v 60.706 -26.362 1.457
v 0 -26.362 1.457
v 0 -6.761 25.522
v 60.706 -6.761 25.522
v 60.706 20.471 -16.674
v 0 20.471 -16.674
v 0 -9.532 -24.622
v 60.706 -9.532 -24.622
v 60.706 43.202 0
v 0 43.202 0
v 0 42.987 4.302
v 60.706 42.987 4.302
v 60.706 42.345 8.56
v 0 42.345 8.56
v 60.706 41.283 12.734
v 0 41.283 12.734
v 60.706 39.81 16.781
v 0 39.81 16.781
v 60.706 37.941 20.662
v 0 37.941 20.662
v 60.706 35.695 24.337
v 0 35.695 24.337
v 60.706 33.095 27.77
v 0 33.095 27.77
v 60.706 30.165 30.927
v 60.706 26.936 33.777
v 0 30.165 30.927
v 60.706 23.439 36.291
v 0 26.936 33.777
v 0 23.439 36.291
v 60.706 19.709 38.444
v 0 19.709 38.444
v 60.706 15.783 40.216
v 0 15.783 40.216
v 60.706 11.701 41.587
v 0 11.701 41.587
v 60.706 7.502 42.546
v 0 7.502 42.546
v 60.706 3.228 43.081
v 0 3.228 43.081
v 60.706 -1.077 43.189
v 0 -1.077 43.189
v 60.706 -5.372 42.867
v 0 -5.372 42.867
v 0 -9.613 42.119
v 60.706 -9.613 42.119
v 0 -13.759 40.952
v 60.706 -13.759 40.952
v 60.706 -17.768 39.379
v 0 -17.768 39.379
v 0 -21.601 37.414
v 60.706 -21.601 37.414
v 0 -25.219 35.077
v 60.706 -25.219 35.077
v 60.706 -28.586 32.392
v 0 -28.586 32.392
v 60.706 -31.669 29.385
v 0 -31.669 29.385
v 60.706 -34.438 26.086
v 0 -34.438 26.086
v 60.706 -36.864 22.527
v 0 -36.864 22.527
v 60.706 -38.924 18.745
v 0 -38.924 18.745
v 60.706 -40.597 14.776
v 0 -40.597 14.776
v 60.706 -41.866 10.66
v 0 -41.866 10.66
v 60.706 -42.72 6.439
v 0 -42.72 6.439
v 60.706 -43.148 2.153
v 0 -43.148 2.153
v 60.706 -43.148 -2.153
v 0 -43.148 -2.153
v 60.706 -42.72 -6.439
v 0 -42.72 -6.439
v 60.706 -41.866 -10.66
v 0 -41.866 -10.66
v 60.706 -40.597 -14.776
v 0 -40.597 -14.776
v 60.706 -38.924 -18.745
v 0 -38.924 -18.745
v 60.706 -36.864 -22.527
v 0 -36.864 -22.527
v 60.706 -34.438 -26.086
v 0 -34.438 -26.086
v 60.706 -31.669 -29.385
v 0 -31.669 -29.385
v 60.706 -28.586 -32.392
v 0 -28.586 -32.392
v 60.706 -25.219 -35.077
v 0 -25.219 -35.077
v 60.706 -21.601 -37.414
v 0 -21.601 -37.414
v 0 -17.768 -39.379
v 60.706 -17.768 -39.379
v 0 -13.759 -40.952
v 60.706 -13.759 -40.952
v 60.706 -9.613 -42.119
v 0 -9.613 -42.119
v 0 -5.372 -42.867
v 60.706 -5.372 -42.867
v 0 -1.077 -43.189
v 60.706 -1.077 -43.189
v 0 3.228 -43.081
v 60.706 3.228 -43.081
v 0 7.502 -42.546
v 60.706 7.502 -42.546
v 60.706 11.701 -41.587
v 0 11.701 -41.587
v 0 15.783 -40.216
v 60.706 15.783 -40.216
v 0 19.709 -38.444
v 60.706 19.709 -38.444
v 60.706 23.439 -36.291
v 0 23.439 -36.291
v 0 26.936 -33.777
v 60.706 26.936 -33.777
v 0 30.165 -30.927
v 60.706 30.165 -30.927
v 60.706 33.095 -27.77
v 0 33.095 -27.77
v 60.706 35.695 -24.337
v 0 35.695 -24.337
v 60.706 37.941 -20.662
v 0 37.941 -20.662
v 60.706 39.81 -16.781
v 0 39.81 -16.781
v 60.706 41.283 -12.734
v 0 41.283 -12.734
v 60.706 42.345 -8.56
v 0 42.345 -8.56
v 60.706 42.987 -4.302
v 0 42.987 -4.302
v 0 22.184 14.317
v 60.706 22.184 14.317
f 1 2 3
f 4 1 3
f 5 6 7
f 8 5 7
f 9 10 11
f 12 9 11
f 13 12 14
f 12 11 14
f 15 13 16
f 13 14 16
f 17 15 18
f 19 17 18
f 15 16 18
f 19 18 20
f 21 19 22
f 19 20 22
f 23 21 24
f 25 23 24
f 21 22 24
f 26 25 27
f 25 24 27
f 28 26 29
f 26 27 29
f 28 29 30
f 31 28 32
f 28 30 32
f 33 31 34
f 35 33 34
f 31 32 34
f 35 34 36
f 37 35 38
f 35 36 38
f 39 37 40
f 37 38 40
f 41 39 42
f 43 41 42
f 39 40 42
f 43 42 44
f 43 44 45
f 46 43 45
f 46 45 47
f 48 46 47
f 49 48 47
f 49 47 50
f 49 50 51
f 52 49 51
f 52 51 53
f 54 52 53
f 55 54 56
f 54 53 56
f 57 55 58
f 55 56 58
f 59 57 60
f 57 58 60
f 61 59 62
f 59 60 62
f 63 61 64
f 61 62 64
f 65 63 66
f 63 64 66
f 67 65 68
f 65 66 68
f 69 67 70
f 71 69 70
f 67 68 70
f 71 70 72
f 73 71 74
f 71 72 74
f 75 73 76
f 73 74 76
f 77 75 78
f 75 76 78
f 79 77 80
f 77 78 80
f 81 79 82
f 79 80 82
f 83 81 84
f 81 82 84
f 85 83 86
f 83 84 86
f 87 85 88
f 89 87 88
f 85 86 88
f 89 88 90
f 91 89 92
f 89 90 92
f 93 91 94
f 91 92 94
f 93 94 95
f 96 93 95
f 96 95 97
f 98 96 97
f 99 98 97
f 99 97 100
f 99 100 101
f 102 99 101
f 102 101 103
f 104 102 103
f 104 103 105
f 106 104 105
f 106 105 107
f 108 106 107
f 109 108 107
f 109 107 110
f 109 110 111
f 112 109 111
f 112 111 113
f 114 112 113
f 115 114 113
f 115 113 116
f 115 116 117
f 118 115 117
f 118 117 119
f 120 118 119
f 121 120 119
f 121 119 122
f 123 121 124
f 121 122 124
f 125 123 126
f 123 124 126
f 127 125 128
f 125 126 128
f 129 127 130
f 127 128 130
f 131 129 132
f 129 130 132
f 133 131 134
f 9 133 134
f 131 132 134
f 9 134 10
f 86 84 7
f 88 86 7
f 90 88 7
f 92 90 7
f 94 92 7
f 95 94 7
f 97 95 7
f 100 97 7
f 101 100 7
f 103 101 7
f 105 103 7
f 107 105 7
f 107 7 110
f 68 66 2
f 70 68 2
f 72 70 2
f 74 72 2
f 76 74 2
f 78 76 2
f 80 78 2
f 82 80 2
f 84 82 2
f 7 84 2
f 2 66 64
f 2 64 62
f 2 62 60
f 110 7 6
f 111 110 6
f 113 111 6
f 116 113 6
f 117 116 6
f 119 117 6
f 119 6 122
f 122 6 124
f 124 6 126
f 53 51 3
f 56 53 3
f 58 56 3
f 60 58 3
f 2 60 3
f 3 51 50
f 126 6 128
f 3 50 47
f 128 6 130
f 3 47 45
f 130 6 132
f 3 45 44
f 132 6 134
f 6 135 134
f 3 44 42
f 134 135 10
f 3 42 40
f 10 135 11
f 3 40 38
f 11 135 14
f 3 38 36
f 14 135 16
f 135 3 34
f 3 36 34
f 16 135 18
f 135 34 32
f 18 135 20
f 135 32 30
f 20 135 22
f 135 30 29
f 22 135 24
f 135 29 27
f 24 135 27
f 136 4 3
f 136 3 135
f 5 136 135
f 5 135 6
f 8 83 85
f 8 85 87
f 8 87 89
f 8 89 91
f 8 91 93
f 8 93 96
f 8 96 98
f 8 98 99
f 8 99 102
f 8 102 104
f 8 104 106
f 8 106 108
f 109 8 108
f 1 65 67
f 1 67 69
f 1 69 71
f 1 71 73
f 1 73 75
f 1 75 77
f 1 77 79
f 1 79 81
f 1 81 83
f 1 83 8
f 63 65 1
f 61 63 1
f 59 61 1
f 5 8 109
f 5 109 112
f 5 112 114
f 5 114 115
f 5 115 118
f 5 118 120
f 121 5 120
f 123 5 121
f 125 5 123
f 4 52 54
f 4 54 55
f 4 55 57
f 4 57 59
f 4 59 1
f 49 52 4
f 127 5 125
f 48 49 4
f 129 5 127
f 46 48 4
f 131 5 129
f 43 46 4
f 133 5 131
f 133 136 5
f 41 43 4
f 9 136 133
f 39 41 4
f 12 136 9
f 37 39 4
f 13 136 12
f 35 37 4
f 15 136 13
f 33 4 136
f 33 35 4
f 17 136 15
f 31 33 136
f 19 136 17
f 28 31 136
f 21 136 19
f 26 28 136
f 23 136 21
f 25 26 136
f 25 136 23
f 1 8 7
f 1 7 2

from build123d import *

# Parameters (mm, degrees)
F1_R     = 43.202069
F2_DEPTH = 60.706


with BuildPart() as f2:
    # F1 (on face) → F2 (new body)
    with BuildSketch(Plane.YZ):
        Circle(F1_R)
        Polygon((-6.760658, 25.522216), (22.183912, 14.316566), (20.471069, -16.674092), (-9.532095, -24.621722), (-26.362228, 1.457031), align=None, mode=Mode.SUBTRACT)
    extrude(amount=F2_DEPTH)


solid = f2.part
